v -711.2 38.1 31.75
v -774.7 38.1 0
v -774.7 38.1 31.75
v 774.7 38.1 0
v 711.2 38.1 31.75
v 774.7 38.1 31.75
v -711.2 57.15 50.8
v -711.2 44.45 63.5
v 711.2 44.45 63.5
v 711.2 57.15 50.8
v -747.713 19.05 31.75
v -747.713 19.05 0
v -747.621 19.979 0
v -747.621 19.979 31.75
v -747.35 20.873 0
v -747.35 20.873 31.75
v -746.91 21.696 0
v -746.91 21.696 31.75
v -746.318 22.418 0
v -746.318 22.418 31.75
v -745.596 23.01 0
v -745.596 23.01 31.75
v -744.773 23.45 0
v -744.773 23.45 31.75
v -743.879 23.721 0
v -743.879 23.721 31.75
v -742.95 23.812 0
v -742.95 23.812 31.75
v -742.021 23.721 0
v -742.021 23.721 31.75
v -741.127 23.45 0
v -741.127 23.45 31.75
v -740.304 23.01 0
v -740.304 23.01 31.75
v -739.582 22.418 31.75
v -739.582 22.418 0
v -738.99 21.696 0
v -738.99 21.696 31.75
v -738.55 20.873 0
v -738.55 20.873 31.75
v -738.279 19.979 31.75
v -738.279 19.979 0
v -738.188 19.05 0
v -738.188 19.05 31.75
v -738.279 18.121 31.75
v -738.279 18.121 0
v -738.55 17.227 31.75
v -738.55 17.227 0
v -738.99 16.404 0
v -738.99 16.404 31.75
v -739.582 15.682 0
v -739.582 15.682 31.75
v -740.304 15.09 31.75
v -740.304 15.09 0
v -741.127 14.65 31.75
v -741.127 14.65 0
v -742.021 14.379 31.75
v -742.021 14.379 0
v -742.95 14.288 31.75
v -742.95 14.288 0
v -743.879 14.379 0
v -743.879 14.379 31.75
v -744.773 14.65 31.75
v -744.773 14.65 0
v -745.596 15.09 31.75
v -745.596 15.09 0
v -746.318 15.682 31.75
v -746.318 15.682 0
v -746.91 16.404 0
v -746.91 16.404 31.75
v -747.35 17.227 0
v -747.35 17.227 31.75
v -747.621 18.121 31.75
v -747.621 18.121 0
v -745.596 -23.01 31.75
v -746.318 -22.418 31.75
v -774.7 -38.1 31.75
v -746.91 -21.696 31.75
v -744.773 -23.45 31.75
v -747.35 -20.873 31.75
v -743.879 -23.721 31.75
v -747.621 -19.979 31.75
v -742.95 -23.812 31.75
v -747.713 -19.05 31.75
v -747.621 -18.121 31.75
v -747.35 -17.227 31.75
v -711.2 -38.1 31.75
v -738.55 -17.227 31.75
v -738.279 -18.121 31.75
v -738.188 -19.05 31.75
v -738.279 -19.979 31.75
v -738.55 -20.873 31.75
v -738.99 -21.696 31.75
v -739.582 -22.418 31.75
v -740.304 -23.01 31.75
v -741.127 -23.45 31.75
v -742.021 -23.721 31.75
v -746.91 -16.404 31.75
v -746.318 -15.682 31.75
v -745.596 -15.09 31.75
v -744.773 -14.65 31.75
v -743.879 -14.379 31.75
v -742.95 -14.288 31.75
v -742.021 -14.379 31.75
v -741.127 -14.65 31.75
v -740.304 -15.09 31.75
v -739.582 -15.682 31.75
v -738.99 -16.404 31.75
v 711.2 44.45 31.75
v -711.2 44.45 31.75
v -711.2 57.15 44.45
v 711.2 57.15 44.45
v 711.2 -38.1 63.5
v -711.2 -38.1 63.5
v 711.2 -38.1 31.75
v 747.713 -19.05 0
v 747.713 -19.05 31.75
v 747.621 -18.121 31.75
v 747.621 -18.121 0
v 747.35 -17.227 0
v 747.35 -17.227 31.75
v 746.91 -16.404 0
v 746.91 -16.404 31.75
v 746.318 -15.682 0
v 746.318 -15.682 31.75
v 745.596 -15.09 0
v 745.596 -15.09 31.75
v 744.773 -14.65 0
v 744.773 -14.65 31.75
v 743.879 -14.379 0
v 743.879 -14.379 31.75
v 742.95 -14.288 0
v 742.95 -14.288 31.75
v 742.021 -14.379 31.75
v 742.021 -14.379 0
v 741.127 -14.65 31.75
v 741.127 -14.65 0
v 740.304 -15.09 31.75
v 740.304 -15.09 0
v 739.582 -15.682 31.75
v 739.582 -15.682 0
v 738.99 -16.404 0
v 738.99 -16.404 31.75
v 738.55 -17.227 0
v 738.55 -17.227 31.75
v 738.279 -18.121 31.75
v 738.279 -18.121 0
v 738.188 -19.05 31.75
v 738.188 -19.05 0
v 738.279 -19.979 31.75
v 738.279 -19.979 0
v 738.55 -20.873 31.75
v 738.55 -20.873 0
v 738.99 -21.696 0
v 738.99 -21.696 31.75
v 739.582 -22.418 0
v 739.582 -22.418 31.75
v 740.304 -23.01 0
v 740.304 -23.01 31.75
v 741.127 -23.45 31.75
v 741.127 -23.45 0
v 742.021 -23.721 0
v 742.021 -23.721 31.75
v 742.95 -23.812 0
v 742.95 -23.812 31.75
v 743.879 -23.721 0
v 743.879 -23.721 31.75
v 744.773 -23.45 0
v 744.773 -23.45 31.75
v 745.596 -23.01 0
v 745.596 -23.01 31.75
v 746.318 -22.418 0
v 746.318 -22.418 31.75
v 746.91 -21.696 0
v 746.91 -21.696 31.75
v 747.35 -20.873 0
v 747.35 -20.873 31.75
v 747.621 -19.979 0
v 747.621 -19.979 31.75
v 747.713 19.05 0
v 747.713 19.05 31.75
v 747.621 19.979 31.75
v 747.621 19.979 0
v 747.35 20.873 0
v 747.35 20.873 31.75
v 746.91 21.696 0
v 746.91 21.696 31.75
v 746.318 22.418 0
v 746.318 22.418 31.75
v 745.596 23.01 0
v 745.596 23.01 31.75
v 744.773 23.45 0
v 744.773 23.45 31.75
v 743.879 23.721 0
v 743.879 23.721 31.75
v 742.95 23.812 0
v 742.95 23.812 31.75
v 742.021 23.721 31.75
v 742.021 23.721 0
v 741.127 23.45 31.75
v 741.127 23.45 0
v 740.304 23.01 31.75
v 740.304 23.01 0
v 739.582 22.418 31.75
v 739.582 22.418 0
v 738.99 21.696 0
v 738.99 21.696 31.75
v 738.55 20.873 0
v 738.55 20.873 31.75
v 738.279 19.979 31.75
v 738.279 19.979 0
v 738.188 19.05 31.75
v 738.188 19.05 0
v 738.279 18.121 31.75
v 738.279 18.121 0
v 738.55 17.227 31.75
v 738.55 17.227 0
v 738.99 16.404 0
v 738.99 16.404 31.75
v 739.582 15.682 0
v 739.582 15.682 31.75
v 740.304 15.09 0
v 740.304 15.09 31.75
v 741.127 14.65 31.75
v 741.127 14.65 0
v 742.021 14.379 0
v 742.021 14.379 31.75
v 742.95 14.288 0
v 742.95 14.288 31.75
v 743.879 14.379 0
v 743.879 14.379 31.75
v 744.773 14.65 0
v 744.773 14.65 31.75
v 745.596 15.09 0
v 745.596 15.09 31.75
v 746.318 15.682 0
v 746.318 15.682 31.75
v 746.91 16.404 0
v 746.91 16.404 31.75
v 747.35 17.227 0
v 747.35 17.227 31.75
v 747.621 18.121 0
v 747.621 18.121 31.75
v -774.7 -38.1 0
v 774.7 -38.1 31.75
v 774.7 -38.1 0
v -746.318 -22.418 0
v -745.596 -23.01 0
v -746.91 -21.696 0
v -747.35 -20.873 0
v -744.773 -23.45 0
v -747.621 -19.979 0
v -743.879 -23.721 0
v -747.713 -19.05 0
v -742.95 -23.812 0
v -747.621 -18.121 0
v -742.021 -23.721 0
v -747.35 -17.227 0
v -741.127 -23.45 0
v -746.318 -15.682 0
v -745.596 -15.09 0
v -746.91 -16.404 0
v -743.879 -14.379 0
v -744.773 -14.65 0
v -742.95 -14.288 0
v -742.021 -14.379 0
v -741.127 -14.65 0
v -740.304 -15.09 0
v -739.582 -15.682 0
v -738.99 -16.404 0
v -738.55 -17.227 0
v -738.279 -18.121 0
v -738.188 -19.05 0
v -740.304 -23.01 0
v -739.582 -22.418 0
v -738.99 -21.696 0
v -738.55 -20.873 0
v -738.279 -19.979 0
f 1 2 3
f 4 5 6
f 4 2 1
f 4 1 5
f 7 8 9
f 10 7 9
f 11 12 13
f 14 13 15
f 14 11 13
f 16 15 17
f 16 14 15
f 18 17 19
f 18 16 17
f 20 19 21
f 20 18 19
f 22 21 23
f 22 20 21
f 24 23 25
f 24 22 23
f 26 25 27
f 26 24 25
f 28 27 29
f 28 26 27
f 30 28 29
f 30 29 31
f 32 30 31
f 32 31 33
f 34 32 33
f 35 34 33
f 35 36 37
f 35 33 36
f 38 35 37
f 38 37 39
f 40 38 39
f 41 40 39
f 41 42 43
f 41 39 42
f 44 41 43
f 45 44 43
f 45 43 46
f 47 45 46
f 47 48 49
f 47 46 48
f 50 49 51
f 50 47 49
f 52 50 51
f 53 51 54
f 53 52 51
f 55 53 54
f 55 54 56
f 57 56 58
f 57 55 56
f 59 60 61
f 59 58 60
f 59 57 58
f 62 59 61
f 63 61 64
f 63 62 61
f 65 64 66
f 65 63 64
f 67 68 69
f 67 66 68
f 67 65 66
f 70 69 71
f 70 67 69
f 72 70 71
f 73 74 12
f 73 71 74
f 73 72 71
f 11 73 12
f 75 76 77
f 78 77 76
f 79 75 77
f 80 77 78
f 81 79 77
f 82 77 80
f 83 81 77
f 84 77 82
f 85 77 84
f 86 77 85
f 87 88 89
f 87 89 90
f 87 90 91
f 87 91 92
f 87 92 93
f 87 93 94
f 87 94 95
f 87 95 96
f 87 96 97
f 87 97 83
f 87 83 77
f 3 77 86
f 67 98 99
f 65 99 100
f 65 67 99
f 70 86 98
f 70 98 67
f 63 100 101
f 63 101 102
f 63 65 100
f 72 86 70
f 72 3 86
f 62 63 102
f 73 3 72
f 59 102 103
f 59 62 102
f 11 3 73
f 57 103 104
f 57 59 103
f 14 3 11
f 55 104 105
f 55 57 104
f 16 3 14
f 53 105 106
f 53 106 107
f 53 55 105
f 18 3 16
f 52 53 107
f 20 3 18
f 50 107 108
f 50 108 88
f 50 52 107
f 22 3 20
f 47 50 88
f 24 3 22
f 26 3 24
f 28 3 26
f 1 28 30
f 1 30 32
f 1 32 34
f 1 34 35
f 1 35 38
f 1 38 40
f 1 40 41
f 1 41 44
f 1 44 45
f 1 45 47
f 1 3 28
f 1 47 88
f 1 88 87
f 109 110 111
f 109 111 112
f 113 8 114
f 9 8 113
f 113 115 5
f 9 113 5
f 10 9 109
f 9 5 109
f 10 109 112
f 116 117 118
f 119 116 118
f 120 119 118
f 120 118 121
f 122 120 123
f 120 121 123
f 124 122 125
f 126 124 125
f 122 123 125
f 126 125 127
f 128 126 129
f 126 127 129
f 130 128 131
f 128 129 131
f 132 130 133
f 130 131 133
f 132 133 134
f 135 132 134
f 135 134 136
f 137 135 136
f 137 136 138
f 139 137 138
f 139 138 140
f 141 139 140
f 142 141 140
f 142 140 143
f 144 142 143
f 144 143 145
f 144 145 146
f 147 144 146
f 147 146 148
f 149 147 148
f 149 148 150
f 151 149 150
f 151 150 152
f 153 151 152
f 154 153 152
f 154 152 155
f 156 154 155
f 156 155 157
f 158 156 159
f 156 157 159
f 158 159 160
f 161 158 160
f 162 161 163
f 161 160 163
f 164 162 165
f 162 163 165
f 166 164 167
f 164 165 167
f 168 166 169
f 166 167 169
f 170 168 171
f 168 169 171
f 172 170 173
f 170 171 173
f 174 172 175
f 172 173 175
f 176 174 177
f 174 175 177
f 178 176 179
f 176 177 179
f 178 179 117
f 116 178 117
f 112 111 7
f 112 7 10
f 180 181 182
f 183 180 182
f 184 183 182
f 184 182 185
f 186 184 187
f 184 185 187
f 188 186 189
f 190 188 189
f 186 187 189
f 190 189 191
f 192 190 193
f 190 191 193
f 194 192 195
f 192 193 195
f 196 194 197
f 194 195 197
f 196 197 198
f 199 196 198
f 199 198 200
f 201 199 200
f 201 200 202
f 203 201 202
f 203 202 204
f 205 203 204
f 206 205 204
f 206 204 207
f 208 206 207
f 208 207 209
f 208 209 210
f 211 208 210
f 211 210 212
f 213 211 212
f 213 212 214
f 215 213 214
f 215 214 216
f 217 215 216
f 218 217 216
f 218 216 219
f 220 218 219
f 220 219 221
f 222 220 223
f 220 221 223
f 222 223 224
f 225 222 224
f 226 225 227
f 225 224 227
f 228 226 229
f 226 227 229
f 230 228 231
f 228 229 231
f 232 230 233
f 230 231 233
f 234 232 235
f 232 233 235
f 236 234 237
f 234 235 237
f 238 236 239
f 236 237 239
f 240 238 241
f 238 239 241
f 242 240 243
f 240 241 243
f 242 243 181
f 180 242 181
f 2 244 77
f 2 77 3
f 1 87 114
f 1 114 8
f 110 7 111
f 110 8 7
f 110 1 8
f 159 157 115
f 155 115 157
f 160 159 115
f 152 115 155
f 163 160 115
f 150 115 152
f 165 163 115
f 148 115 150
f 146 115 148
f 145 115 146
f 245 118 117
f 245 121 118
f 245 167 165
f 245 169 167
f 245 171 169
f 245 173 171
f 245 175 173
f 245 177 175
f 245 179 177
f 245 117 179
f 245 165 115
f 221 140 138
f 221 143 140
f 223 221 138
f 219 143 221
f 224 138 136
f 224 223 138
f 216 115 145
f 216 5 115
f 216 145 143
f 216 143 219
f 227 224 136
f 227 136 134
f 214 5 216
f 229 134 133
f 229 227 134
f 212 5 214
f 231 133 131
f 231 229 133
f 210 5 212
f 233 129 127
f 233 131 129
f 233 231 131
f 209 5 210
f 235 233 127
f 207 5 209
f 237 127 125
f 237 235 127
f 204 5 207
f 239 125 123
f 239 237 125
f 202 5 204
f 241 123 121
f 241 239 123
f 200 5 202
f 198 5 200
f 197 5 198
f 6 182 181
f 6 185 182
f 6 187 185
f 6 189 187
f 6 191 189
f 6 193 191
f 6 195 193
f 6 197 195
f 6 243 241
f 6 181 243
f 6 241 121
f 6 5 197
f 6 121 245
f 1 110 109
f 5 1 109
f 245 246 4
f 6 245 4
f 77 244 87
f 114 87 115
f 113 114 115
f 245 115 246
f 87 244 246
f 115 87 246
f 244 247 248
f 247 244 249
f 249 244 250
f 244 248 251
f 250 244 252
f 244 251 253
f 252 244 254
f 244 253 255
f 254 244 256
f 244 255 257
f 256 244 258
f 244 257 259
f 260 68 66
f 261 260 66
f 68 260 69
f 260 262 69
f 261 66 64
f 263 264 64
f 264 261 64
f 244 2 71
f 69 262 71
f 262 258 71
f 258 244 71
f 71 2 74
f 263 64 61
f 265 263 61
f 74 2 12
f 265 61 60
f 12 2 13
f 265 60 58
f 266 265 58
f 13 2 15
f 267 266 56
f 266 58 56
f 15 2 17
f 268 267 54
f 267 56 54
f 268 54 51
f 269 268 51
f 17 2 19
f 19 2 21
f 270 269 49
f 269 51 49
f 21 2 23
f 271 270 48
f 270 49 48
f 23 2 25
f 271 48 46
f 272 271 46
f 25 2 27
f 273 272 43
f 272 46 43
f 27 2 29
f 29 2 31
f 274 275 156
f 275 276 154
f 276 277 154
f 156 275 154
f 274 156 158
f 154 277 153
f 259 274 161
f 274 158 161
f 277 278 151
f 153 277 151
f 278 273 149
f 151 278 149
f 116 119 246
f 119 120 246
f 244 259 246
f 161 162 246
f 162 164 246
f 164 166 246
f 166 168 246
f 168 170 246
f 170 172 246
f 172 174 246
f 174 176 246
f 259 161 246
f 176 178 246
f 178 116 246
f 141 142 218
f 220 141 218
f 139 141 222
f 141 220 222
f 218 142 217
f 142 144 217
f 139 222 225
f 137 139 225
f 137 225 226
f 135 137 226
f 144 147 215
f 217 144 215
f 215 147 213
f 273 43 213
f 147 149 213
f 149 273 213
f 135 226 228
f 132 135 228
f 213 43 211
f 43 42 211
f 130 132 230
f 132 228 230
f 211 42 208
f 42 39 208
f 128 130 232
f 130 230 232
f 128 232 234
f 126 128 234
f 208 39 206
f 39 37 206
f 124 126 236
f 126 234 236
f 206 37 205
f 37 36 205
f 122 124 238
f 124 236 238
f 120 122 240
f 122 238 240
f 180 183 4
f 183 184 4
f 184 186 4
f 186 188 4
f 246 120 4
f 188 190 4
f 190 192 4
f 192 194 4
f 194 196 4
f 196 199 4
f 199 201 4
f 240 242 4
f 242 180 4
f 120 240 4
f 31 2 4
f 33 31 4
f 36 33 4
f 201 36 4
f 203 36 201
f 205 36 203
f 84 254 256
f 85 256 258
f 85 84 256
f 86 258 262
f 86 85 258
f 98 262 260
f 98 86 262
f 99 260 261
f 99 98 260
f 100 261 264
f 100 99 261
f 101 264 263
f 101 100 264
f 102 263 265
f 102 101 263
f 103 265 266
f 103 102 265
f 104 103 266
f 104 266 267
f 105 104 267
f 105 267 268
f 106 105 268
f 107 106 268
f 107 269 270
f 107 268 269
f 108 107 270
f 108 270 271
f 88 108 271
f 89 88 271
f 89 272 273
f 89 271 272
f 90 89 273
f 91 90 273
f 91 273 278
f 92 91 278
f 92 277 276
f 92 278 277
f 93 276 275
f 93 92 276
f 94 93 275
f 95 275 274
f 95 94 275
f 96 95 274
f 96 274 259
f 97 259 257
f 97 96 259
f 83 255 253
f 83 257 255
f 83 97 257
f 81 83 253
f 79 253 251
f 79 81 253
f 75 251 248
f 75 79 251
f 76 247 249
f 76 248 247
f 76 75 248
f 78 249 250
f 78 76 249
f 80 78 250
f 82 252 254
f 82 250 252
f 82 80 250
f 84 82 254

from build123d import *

# Parameters (mm, degrees)
SKETCH1_W           = 1549.4
SKETCH1_H           = 76.2
BOSS_EXTRUDE1_DEPTH = 31.75
SKETCH2_R           = 4.7625
CUT_EXTRUDE1_DEPTH  = 777.285876788
SKETCH3_W           = 1422.4
SKETCH3_H           = 95.25
BOSS_EXTRUDE2_DEPTH = 31.75
CHAMFER1_SIZE       = 12.7


with BuildPart() as part:
    # Sketch1 → Boss-Extrude1 (new body)
    with BuildSketch(Plane.XY):
        Rectangle(SKETCH1_W, SKETCH1_H)
    extrude(amount=BOSS_EXTRUDE1_DEPTH)

    # Sketch2 → Cut-Extrude1 (cut, through all)
    with BuildSketch(Plane.XY.offset(31.75)):
        with Locations((742.95, 19.05)):
            Circle(SKETCH2_R)
        with Locations((742.95, -19.05)):
            Circle(SKETCH2_R)
    cut_extrude1 = extrude(amount=-CUT_EXTRUDE1_DEPTH, mode=Mode.SUBTRACT)

    # Mirror1: Cut-Extrude1 across plane
    add(cut_extrude1.mirror(Plane(origin=(0, 0, 0), x_dir=(0, 0, 1), z_dir=(1, 0, 0))), mode=Mode.SUBTRACT)

    # Sketch3 → Boss-Extrude2 (add)
    with BuildSketch(Plane.XY.offset(31.75)):
        with Locations((0, 9.525)):
            Rectangle(SKETCH3_W, SKETCH3_H)
    extrude(amount=BOSS_EXTRUDE2_DEPTH)

    # Chamfer1
    chamfer1_edges = [part.edges().sort_by_distance(p)[0] for p in [
        (0, 57.15, 31.75),
        (0, 57.15, 63.5),
    ]]
    chamfer(chamfer1_edges, length=CHAMFER1_SIZE)


solid = part.part
